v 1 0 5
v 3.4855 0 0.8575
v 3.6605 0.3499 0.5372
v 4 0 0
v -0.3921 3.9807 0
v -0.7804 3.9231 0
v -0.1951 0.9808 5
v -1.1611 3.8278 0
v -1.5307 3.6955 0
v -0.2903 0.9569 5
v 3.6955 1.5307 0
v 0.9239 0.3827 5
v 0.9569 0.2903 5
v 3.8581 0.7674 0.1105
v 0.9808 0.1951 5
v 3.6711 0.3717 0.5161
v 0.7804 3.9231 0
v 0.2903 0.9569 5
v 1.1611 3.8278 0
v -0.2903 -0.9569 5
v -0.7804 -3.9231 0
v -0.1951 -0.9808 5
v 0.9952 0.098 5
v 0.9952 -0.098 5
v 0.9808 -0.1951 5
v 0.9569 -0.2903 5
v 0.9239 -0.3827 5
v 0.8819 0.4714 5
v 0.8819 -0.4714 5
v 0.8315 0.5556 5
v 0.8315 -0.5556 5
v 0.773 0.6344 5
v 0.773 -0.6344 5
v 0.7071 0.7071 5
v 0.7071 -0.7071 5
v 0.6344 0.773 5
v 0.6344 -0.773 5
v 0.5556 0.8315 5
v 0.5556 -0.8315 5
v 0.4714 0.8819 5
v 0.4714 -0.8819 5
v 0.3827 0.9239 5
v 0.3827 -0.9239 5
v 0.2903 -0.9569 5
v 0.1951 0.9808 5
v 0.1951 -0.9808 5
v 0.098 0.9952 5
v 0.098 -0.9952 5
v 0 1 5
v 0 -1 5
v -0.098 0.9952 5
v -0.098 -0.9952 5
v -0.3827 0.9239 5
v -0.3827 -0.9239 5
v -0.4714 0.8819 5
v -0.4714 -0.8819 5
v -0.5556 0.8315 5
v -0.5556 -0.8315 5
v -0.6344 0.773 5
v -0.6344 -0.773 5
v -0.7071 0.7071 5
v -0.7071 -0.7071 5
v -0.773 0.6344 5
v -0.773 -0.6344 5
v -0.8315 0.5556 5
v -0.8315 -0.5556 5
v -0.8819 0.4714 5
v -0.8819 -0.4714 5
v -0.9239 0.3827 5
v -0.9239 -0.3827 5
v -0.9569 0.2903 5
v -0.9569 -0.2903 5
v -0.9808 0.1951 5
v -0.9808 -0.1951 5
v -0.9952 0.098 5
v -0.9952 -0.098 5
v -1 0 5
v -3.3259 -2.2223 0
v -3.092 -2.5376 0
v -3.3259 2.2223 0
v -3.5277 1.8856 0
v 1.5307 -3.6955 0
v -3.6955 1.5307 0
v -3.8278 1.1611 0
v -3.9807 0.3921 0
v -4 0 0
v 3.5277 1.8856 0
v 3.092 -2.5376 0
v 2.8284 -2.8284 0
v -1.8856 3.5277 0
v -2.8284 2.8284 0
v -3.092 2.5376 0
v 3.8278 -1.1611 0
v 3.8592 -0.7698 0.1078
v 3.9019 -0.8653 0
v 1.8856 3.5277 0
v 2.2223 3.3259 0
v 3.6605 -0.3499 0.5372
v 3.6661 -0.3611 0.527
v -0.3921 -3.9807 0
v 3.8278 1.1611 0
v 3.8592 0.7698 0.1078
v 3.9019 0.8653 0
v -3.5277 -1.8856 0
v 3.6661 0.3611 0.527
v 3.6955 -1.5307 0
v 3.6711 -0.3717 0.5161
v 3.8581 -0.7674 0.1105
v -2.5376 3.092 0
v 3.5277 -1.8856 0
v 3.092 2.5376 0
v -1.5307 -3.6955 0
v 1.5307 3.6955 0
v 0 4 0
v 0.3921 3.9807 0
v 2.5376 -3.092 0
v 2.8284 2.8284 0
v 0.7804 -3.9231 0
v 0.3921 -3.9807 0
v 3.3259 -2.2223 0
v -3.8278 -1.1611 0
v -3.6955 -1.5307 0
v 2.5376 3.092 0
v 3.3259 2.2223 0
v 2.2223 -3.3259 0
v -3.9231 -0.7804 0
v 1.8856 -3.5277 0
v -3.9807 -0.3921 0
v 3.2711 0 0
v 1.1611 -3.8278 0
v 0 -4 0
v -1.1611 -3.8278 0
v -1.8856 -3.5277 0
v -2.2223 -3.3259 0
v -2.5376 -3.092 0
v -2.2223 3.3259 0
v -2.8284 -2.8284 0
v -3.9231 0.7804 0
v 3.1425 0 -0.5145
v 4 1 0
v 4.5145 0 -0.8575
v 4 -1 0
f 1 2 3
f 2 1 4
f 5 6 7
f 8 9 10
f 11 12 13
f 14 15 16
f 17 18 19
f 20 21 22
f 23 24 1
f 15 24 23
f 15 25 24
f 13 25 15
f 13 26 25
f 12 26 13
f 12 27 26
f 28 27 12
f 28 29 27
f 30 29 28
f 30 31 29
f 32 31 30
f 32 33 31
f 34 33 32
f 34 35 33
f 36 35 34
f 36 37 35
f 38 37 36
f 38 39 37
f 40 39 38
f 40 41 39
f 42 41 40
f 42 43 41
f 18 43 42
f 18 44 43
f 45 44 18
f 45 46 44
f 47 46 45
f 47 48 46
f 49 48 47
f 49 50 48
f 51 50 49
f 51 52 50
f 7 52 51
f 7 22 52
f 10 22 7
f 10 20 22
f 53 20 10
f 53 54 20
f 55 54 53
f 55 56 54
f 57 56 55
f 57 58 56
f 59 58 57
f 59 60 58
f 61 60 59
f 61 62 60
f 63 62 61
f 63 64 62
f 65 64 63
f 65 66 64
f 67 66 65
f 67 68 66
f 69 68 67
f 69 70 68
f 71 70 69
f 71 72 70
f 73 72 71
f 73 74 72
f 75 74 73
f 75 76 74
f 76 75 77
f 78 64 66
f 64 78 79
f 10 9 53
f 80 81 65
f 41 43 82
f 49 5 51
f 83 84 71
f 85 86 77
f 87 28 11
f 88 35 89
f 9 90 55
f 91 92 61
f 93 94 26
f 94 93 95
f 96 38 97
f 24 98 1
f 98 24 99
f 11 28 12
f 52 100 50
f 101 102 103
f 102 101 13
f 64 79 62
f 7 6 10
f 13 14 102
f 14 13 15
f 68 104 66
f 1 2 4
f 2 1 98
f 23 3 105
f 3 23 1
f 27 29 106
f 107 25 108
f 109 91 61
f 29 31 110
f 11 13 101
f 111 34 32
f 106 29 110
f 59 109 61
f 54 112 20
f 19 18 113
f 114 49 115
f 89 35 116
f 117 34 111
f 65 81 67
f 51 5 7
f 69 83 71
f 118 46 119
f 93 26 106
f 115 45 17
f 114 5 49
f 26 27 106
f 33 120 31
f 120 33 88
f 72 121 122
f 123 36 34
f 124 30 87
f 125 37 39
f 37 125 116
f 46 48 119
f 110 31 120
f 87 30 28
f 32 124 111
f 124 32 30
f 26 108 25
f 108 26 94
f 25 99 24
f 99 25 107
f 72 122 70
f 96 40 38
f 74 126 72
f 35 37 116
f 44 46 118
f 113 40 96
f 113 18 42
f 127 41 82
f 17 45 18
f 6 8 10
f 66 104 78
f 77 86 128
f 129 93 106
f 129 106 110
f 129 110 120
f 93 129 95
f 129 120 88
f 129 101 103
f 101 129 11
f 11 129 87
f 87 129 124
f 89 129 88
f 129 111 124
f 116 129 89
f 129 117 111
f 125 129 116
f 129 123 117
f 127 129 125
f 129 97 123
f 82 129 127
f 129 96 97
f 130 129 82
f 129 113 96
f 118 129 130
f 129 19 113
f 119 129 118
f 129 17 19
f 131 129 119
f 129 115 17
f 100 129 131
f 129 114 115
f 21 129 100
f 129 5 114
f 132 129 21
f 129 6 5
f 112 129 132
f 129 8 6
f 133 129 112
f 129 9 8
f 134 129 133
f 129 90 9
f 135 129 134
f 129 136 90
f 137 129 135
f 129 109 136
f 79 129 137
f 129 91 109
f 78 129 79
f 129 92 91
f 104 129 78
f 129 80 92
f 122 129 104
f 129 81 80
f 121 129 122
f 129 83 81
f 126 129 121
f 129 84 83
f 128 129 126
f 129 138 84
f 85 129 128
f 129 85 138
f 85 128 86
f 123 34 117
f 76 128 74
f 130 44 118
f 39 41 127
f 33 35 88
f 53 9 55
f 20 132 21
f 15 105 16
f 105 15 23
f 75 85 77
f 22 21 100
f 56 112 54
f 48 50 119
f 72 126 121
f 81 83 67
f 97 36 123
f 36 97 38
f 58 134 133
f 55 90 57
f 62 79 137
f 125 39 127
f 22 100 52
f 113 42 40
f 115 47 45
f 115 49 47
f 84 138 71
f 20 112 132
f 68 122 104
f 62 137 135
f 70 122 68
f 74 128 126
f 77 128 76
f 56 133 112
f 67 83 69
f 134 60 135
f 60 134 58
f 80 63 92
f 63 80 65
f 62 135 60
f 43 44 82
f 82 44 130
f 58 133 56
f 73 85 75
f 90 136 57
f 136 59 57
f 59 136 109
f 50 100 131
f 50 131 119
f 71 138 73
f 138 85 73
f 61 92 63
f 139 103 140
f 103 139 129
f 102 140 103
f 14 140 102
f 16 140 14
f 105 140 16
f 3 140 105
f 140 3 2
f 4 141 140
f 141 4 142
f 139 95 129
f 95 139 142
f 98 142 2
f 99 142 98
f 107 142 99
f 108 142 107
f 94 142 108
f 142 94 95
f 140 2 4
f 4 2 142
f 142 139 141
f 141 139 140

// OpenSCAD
module knurled_cone( r1=4, r2=1, h = 5, dent_h = 1 ) {
    color("cyan", 0.3) cylinder(r1=r1, r2=r2, h=h, $fn=64);
    #translate([r1,0,0]) rotate([0,180+atan(h/(r1-r2)),0]) cylinder(r1=dent_h,r2=0, h=dent_h, $fn=4);

}

knurled_cone();
